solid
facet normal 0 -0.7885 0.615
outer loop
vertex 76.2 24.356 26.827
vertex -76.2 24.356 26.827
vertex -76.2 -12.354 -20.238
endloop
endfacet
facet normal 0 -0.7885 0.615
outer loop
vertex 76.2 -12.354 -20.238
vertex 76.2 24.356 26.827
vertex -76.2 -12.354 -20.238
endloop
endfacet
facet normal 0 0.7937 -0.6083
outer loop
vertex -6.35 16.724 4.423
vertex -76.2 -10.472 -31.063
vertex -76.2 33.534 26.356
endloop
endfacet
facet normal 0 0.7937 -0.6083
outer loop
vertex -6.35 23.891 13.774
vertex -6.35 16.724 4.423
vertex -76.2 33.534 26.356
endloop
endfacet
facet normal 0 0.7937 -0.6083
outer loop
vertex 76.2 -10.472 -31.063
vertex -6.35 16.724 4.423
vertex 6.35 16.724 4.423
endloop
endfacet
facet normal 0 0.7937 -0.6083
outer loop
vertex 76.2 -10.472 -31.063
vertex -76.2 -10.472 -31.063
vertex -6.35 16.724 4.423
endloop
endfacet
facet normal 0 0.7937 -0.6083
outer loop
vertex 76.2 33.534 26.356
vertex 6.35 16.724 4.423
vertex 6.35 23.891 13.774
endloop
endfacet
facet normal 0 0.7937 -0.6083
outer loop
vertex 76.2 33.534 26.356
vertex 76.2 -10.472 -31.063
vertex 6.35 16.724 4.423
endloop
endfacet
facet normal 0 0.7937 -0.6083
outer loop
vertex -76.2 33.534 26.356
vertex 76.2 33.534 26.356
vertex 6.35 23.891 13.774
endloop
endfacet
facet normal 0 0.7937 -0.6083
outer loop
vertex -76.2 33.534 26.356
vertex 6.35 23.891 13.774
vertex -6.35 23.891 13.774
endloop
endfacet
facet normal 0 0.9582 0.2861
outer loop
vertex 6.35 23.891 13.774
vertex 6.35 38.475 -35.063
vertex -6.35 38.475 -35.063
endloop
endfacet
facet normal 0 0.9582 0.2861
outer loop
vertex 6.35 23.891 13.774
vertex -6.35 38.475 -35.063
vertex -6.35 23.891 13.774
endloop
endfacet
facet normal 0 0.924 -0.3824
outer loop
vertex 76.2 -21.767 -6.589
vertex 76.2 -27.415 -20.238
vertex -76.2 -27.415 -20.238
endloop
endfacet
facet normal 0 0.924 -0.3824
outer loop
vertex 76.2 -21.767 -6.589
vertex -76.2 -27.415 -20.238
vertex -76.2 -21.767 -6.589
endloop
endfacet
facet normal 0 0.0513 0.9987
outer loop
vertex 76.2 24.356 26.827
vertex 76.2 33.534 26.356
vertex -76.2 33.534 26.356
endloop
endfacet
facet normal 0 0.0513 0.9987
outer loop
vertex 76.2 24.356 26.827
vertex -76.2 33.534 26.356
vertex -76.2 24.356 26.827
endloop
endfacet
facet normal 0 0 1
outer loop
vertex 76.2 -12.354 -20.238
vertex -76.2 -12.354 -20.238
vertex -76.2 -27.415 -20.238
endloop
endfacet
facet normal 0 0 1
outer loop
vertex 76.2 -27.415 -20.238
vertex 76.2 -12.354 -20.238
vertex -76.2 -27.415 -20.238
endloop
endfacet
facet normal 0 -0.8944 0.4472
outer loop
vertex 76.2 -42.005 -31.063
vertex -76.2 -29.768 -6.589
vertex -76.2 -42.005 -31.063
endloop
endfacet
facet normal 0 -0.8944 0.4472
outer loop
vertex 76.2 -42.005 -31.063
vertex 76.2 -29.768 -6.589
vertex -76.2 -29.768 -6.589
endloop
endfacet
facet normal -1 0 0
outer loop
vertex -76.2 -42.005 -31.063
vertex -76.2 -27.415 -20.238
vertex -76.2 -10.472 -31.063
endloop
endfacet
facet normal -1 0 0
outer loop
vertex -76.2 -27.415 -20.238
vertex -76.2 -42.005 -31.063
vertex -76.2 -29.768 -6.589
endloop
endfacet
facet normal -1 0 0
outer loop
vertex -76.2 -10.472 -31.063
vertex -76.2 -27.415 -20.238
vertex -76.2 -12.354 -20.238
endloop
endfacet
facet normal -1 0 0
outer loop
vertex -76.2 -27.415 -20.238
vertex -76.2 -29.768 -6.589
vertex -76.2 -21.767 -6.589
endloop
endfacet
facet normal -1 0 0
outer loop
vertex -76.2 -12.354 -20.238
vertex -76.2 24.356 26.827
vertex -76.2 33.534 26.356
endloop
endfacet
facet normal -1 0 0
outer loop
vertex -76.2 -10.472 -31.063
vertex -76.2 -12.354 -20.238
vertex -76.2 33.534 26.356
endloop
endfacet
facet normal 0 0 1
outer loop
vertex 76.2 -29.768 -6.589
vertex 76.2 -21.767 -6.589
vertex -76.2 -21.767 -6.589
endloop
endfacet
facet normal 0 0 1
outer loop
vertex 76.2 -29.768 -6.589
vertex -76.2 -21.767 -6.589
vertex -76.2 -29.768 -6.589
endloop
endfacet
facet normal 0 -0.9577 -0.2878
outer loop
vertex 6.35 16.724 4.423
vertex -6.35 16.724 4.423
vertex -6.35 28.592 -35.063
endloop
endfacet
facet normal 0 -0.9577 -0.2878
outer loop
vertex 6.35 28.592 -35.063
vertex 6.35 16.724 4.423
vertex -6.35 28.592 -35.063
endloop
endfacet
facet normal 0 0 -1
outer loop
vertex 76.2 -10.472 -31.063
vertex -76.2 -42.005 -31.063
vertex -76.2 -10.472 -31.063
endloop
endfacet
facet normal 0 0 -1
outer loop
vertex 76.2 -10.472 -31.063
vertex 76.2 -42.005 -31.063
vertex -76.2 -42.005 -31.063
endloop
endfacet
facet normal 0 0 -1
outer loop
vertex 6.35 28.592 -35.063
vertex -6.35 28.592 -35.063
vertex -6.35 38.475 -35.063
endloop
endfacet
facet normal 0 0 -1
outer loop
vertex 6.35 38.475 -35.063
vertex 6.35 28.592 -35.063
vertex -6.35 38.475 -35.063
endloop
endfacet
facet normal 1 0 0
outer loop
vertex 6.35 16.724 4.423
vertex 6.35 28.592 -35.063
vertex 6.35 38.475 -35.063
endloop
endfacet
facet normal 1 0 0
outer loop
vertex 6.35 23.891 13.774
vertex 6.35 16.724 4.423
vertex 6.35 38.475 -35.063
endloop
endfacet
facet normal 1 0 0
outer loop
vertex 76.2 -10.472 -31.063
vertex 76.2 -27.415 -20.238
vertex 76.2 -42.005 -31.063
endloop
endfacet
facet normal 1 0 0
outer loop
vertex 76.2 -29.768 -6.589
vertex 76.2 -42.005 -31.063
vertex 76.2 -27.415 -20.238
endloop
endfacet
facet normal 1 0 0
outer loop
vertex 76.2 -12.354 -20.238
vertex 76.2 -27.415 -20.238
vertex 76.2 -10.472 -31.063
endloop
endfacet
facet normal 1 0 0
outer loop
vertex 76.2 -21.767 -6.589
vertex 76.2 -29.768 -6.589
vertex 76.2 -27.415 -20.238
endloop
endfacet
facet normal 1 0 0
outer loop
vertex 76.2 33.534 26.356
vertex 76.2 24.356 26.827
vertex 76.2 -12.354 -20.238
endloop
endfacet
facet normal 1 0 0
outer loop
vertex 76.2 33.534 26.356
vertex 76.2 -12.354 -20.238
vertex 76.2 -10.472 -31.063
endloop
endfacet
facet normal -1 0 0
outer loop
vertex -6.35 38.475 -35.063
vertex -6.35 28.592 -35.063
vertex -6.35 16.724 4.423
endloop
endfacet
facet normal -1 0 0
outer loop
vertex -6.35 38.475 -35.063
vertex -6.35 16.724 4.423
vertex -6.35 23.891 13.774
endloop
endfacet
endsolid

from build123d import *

# Parameters (mm, degrees)
F1_DEPTH      = 76.2
F1_DEPTH_BACK = 76.2
F3_DEPTH      = 6.35
F3_DEPTH_BACK = 6.35


with BuildPart() as f1:
    # F0 (on Right) → F1 (new body, two sides)
    with BuildSketch(Plane.YZ) as f1_sk:
        Polygon((-10.471897, -31.062707), (33.533607, 26.356237), (24.355987, 26.826883), (-12.354486, -20.237826), (-27.415192, -20.237826), (-21.767426, -6.589059), (-29.768426, -6.589059), (-42.005252, -31.062707), align=None)
    extrude(amount=F1_DEPTH)
    extrude(f1_sk.sketch, amount=-F1_DEPTH_BACK)

    # F2 (on Right) → F3 (join, two sides)
    with BuildSketch(Plane.YZ) as f3_sk:
        Polygon((38.475402, -35.063207), (22.944046, 16.943295), (15.649015, 8.001001), (28.59181, -35.063207), align=None)
    extrude(amount=F3_DEPTH)
    extrude(f3_sk.sketch, amount=-F3_DEPTH_BACK)


solid = f1.part
